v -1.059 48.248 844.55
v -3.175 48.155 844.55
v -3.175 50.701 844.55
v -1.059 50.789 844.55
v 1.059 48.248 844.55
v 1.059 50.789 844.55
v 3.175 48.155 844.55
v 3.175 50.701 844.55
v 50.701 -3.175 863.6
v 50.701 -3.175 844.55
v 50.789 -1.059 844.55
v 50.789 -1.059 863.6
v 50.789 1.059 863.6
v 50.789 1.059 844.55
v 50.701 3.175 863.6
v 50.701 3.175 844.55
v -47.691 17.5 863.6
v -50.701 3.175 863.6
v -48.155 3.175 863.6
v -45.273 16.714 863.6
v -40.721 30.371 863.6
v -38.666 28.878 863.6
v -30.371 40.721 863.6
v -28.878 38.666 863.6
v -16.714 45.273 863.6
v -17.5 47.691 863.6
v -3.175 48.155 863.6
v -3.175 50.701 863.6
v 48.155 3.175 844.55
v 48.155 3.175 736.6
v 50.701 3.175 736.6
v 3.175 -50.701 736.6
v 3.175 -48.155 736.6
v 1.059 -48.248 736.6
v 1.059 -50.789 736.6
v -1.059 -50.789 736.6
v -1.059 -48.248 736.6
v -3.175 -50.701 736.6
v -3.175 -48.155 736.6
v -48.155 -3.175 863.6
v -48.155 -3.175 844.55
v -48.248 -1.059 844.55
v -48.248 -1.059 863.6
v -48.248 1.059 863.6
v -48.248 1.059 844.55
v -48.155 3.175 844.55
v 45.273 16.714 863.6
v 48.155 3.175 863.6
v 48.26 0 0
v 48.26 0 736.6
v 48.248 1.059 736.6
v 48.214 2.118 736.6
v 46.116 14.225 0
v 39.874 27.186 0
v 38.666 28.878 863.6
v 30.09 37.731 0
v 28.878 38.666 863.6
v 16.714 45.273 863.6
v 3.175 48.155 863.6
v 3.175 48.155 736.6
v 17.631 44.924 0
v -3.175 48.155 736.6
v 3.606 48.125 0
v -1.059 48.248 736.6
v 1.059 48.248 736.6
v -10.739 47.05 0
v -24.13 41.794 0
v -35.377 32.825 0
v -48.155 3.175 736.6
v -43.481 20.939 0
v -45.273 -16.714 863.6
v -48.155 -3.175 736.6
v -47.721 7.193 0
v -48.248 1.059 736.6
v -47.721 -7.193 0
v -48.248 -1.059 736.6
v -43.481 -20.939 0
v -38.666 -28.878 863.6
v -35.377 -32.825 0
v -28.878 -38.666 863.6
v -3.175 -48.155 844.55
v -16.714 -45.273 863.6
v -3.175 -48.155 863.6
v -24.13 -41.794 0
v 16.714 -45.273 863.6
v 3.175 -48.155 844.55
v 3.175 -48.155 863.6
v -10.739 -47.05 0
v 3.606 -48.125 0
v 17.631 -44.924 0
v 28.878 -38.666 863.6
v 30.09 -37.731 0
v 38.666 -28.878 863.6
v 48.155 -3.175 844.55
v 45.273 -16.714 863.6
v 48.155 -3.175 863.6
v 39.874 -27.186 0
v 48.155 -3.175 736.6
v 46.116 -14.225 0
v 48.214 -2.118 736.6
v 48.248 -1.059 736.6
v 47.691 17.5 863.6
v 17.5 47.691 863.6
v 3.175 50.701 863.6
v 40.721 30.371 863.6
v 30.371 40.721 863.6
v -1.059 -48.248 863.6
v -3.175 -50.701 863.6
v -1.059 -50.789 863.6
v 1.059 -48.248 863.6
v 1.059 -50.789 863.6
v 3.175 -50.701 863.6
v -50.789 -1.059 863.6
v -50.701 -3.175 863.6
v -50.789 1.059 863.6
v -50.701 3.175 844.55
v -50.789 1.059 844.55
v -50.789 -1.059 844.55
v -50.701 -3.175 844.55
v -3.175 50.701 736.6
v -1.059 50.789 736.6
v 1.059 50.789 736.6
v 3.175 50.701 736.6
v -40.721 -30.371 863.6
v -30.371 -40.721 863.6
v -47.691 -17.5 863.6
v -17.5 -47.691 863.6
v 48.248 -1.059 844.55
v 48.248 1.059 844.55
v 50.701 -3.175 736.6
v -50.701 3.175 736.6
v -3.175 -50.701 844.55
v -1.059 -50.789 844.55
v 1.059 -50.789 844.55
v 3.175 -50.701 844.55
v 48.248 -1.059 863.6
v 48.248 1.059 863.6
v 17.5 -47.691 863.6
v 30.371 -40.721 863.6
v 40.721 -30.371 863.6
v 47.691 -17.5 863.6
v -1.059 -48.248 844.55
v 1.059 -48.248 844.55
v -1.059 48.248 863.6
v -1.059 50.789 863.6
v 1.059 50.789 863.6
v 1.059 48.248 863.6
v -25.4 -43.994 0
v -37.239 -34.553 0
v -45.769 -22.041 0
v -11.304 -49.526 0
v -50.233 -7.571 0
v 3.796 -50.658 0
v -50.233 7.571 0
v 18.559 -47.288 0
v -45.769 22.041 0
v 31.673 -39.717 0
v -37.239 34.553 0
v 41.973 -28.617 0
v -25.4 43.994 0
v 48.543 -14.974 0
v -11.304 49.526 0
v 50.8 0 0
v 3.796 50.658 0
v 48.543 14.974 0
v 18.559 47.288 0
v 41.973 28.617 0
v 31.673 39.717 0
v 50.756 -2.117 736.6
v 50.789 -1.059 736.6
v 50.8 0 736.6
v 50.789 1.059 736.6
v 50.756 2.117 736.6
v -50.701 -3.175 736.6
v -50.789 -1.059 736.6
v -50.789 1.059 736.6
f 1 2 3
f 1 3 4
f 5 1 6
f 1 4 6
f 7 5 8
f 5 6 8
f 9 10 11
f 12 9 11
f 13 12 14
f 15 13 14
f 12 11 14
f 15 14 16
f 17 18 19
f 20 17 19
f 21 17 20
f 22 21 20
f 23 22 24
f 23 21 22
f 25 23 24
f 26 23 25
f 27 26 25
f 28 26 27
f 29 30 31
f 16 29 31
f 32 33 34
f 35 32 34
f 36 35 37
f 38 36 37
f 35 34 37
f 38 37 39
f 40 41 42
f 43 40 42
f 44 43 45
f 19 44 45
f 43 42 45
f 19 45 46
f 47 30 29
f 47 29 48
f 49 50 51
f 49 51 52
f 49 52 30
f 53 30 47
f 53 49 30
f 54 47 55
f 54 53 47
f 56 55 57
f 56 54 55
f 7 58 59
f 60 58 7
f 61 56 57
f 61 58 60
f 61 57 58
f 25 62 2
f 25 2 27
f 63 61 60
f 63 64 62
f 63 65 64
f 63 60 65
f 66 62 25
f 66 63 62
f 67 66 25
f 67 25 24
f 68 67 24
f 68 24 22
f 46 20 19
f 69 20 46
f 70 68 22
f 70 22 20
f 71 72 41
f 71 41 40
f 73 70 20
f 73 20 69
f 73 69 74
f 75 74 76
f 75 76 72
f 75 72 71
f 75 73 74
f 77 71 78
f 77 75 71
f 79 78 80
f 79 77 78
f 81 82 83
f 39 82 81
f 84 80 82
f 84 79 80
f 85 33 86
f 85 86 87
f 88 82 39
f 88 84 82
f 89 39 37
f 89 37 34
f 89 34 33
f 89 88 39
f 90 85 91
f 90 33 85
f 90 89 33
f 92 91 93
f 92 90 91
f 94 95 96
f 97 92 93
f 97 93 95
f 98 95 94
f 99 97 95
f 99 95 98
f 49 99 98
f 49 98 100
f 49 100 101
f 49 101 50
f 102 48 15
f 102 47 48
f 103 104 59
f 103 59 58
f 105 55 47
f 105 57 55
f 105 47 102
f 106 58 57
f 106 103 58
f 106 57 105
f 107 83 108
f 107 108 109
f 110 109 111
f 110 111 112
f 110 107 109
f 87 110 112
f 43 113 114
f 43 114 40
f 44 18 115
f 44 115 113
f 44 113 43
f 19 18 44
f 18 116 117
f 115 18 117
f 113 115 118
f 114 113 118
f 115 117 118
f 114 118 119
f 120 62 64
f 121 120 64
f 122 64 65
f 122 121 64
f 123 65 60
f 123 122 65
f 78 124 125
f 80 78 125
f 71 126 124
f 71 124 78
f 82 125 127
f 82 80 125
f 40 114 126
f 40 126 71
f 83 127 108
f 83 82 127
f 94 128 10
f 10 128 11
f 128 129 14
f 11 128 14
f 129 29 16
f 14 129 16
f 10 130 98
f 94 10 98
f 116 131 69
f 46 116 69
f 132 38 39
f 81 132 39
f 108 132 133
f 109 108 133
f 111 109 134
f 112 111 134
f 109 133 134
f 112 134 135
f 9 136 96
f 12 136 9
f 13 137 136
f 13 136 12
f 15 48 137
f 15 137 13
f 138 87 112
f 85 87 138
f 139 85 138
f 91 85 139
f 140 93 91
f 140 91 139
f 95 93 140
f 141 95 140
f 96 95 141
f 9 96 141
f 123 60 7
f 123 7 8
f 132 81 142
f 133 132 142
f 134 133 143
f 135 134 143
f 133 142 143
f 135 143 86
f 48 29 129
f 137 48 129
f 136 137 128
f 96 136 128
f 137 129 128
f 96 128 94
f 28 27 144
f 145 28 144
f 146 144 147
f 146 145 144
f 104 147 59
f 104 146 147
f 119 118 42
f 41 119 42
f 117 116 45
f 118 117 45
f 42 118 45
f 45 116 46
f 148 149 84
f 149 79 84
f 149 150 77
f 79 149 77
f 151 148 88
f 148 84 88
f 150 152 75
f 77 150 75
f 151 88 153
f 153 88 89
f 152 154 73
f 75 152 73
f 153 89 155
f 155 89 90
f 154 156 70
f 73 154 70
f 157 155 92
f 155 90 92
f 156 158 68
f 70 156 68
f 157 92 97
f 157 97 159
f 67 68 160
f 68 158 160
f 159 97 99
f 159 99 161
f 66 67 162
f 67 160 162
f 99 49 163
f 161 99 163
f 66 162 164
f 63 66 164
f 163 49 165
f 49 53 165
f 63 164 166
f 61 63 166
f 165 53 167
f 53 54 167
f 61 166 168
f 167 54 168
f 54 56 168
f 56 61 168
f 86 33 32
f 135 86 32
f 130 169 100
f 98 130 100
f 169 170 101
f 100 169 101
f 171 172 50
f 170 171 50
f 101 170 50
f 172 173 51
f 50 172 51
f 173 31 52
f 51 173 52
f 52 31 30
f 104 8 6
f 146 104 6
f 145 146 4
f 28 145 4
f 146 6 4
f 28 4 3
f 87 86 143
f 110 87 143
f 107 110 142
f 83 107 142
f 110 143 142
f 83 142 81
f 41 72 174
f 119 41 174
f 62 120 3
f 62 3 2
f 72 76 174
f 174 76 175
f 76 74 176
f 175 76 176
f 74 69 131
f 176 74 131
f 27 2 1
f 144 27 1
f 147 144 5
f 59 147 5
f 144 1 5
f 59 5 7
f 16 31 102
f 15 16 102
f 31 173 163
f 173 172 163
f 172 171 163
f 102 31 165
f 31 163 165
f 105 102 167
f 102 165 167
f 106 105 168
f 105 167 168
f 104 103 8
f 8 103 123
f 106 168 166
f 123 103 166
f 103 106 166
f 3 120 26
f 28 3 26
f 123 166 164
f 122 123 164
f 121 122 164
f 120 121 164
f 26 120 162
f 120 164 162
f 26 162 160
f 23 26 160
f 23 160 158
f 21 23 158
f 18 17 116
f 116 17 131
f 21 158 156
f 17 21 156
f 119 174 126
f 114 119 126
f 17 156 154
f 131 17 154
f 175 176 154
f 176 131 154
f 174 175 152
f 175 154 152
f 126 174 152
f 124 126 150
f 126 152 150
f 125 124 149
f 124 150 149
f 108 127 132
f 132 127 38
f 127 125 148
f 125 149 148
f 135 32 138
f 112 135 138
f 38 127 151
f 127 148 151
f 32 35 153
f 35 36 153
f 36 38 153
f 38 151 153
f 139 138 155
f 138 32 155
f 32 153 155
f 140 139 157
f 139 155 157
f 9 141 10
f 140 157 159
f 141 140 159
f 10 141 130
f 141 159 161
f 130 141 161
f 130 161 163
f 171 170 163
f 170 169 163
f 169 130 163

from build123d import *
from build123d.topology import SkipClean

# Parameters (mm, degrees)
SKETCH1_R           = 50.8
SKETCH1_R_2         = 48.26
BOSS_EXTRUDE1_DEPTH = 863.6
CUT_EXTRUDE1_START  = -127
CUT_EXTRUDE1_DEPTH  = 127
BOSS_EXTRUDE2_START = -19.05
BOSS_EXTRUDE2_DEPTH = 19.05


with BuildPart() as part:
    # Sketch1 → Boss-Extrude1 (new body)
    with BuildSketch(Plane.XY):
        Circle(SKETCH1_R)
        Circle(SKETCH1_R_2, mode=Mode.SUBTRACT)
    extrude(amount=BOSS_EXTRUDE1_DEPTH)

    # Sketch2 → Cut-Extrude1 (cut)
    with BuildSketch(Plane.XY.offset(863.6).offset(CUT_EXTRUDE1_START)):
        with BuildLine():
            Line((-3.175, 50.700684167), (-3.175, 48.155445954))
            ThreePointArc((-3.175, 48.155445954), (0, 48.26), (3.175, 48.155445954))
            Line((3.175, 48.155445954), (3.175, 50.700684167))
            ThreePointArc((3.175, 50.700684167), (0, 50.8), (-3.175, 50.700684167))
        make_face()
        with BuildLine():
            Line((-50.700684167, 3.175), (-48.155445954, 3.175))
            ThreePointArc((-48.155445954, 3.175), (-48.26, 0), (-48.155445954, -3.175))
            Line((-48.155445954, -3.175), (-50.700684167, -3.175))
            ThreePointArc((-50.700684167, -3.175), (-50.8, 0), (-50.700684167, 3.175))
        make_face()
        with BuildLine():
            Line((48.155445954, 3.175), (50.700684167, 3.175))
            ThreePointArc((50.700684167, 3.175), (50.8, 0), (50.700684167, -3.175))
            Line((50.700684167, -3.175), (48.155445954, -3.175))
            ThreePointArc((48.155445954, -3.175), (48.26, 0), (48.155445954, 3.175))
        make_face()
        with BuildLine():
            Line((3.175, -48.155445954), (3.175, -50.700684167))
            ThreePointArc((3.175, -50.700684167), (0, -50.8), (-3.175, -50.700684167))
            Line((-3.175, -50.700684167), (-3.175, -48.155445954))
            ThreePointArc((-3.175, -48.155445954), (0, -48.26), (3.175, -48.155445954))
        make_face()
    extrude(amount=CUT_EXTRUDE1_DEPTH, mode=Mode.SUBTRACT)

    # Sketch4 → Boss-Extrude2 (add)
    with SkipClean():  # the faces are left unmerged after this step: merging them gives an invalid solid
        with BuildSketch(Plane.XY.offset(863.6).offset(BOSS_EXTRUDE2_START)):
            with BuildLine():
                Line((-3.175, 50.700684167), (-3.175, 48.155445954))
                ThreePointArc((-3.175, 48.155445954), (0, 48.26), (3.175, 48.155445954))
                Line((3.175, 48.155445954), (3.175, 50.700684167))
                ThreePointArc((3.175, 50.700684167), (0, 50.8), (-3.175, 50.700684167))
            make_face()
            with BuildLine():
                Line((50.700684167, 3.175), (48.155445954, 3.175))
                ThreePointArc((48.155445954, 3.175), (48.26, 0), (48.155445954, -3.175))
                Line((48.155445954, -3.175), (50.700684167, -3.175))
                ThreePointArc((50.700684167, -3.175), (50.8, 0), (50.700684167, 3.175))
            make_face()
            with BuildLine():
                Line((3.175, -50.700684167), (3.175, -48.155445954))
                ThreePointArc((3.175, -48.155445954), (0, -48.26), (-3.175, -48.155445954))
                Line((-3.175, -48.155445954), (-3.175, -50.700684167))
                ThreePointArc((-3.175, -50.700684167), (0, -50.8), (3.175, -50.700684167))
            make_face()
            with BuildLine():
                Line((-48.155445954, 3.175), (-50.700684167, 3.175))
                ThreePointArc((-50.700684167, 3.175), (-50.8, 0), (-50.700684167, -3.175))
                Line((-50.700684167, -3.175), (-48.155445954, -3.175))
                ThreePointArc((-48.155445954, -3.175), (-48.26, 0), (-48.155445954, 3.175))
            make_face()
        extrude(amount=BOSS_EXTRUDE2_DEPTH)


solid = part.part
